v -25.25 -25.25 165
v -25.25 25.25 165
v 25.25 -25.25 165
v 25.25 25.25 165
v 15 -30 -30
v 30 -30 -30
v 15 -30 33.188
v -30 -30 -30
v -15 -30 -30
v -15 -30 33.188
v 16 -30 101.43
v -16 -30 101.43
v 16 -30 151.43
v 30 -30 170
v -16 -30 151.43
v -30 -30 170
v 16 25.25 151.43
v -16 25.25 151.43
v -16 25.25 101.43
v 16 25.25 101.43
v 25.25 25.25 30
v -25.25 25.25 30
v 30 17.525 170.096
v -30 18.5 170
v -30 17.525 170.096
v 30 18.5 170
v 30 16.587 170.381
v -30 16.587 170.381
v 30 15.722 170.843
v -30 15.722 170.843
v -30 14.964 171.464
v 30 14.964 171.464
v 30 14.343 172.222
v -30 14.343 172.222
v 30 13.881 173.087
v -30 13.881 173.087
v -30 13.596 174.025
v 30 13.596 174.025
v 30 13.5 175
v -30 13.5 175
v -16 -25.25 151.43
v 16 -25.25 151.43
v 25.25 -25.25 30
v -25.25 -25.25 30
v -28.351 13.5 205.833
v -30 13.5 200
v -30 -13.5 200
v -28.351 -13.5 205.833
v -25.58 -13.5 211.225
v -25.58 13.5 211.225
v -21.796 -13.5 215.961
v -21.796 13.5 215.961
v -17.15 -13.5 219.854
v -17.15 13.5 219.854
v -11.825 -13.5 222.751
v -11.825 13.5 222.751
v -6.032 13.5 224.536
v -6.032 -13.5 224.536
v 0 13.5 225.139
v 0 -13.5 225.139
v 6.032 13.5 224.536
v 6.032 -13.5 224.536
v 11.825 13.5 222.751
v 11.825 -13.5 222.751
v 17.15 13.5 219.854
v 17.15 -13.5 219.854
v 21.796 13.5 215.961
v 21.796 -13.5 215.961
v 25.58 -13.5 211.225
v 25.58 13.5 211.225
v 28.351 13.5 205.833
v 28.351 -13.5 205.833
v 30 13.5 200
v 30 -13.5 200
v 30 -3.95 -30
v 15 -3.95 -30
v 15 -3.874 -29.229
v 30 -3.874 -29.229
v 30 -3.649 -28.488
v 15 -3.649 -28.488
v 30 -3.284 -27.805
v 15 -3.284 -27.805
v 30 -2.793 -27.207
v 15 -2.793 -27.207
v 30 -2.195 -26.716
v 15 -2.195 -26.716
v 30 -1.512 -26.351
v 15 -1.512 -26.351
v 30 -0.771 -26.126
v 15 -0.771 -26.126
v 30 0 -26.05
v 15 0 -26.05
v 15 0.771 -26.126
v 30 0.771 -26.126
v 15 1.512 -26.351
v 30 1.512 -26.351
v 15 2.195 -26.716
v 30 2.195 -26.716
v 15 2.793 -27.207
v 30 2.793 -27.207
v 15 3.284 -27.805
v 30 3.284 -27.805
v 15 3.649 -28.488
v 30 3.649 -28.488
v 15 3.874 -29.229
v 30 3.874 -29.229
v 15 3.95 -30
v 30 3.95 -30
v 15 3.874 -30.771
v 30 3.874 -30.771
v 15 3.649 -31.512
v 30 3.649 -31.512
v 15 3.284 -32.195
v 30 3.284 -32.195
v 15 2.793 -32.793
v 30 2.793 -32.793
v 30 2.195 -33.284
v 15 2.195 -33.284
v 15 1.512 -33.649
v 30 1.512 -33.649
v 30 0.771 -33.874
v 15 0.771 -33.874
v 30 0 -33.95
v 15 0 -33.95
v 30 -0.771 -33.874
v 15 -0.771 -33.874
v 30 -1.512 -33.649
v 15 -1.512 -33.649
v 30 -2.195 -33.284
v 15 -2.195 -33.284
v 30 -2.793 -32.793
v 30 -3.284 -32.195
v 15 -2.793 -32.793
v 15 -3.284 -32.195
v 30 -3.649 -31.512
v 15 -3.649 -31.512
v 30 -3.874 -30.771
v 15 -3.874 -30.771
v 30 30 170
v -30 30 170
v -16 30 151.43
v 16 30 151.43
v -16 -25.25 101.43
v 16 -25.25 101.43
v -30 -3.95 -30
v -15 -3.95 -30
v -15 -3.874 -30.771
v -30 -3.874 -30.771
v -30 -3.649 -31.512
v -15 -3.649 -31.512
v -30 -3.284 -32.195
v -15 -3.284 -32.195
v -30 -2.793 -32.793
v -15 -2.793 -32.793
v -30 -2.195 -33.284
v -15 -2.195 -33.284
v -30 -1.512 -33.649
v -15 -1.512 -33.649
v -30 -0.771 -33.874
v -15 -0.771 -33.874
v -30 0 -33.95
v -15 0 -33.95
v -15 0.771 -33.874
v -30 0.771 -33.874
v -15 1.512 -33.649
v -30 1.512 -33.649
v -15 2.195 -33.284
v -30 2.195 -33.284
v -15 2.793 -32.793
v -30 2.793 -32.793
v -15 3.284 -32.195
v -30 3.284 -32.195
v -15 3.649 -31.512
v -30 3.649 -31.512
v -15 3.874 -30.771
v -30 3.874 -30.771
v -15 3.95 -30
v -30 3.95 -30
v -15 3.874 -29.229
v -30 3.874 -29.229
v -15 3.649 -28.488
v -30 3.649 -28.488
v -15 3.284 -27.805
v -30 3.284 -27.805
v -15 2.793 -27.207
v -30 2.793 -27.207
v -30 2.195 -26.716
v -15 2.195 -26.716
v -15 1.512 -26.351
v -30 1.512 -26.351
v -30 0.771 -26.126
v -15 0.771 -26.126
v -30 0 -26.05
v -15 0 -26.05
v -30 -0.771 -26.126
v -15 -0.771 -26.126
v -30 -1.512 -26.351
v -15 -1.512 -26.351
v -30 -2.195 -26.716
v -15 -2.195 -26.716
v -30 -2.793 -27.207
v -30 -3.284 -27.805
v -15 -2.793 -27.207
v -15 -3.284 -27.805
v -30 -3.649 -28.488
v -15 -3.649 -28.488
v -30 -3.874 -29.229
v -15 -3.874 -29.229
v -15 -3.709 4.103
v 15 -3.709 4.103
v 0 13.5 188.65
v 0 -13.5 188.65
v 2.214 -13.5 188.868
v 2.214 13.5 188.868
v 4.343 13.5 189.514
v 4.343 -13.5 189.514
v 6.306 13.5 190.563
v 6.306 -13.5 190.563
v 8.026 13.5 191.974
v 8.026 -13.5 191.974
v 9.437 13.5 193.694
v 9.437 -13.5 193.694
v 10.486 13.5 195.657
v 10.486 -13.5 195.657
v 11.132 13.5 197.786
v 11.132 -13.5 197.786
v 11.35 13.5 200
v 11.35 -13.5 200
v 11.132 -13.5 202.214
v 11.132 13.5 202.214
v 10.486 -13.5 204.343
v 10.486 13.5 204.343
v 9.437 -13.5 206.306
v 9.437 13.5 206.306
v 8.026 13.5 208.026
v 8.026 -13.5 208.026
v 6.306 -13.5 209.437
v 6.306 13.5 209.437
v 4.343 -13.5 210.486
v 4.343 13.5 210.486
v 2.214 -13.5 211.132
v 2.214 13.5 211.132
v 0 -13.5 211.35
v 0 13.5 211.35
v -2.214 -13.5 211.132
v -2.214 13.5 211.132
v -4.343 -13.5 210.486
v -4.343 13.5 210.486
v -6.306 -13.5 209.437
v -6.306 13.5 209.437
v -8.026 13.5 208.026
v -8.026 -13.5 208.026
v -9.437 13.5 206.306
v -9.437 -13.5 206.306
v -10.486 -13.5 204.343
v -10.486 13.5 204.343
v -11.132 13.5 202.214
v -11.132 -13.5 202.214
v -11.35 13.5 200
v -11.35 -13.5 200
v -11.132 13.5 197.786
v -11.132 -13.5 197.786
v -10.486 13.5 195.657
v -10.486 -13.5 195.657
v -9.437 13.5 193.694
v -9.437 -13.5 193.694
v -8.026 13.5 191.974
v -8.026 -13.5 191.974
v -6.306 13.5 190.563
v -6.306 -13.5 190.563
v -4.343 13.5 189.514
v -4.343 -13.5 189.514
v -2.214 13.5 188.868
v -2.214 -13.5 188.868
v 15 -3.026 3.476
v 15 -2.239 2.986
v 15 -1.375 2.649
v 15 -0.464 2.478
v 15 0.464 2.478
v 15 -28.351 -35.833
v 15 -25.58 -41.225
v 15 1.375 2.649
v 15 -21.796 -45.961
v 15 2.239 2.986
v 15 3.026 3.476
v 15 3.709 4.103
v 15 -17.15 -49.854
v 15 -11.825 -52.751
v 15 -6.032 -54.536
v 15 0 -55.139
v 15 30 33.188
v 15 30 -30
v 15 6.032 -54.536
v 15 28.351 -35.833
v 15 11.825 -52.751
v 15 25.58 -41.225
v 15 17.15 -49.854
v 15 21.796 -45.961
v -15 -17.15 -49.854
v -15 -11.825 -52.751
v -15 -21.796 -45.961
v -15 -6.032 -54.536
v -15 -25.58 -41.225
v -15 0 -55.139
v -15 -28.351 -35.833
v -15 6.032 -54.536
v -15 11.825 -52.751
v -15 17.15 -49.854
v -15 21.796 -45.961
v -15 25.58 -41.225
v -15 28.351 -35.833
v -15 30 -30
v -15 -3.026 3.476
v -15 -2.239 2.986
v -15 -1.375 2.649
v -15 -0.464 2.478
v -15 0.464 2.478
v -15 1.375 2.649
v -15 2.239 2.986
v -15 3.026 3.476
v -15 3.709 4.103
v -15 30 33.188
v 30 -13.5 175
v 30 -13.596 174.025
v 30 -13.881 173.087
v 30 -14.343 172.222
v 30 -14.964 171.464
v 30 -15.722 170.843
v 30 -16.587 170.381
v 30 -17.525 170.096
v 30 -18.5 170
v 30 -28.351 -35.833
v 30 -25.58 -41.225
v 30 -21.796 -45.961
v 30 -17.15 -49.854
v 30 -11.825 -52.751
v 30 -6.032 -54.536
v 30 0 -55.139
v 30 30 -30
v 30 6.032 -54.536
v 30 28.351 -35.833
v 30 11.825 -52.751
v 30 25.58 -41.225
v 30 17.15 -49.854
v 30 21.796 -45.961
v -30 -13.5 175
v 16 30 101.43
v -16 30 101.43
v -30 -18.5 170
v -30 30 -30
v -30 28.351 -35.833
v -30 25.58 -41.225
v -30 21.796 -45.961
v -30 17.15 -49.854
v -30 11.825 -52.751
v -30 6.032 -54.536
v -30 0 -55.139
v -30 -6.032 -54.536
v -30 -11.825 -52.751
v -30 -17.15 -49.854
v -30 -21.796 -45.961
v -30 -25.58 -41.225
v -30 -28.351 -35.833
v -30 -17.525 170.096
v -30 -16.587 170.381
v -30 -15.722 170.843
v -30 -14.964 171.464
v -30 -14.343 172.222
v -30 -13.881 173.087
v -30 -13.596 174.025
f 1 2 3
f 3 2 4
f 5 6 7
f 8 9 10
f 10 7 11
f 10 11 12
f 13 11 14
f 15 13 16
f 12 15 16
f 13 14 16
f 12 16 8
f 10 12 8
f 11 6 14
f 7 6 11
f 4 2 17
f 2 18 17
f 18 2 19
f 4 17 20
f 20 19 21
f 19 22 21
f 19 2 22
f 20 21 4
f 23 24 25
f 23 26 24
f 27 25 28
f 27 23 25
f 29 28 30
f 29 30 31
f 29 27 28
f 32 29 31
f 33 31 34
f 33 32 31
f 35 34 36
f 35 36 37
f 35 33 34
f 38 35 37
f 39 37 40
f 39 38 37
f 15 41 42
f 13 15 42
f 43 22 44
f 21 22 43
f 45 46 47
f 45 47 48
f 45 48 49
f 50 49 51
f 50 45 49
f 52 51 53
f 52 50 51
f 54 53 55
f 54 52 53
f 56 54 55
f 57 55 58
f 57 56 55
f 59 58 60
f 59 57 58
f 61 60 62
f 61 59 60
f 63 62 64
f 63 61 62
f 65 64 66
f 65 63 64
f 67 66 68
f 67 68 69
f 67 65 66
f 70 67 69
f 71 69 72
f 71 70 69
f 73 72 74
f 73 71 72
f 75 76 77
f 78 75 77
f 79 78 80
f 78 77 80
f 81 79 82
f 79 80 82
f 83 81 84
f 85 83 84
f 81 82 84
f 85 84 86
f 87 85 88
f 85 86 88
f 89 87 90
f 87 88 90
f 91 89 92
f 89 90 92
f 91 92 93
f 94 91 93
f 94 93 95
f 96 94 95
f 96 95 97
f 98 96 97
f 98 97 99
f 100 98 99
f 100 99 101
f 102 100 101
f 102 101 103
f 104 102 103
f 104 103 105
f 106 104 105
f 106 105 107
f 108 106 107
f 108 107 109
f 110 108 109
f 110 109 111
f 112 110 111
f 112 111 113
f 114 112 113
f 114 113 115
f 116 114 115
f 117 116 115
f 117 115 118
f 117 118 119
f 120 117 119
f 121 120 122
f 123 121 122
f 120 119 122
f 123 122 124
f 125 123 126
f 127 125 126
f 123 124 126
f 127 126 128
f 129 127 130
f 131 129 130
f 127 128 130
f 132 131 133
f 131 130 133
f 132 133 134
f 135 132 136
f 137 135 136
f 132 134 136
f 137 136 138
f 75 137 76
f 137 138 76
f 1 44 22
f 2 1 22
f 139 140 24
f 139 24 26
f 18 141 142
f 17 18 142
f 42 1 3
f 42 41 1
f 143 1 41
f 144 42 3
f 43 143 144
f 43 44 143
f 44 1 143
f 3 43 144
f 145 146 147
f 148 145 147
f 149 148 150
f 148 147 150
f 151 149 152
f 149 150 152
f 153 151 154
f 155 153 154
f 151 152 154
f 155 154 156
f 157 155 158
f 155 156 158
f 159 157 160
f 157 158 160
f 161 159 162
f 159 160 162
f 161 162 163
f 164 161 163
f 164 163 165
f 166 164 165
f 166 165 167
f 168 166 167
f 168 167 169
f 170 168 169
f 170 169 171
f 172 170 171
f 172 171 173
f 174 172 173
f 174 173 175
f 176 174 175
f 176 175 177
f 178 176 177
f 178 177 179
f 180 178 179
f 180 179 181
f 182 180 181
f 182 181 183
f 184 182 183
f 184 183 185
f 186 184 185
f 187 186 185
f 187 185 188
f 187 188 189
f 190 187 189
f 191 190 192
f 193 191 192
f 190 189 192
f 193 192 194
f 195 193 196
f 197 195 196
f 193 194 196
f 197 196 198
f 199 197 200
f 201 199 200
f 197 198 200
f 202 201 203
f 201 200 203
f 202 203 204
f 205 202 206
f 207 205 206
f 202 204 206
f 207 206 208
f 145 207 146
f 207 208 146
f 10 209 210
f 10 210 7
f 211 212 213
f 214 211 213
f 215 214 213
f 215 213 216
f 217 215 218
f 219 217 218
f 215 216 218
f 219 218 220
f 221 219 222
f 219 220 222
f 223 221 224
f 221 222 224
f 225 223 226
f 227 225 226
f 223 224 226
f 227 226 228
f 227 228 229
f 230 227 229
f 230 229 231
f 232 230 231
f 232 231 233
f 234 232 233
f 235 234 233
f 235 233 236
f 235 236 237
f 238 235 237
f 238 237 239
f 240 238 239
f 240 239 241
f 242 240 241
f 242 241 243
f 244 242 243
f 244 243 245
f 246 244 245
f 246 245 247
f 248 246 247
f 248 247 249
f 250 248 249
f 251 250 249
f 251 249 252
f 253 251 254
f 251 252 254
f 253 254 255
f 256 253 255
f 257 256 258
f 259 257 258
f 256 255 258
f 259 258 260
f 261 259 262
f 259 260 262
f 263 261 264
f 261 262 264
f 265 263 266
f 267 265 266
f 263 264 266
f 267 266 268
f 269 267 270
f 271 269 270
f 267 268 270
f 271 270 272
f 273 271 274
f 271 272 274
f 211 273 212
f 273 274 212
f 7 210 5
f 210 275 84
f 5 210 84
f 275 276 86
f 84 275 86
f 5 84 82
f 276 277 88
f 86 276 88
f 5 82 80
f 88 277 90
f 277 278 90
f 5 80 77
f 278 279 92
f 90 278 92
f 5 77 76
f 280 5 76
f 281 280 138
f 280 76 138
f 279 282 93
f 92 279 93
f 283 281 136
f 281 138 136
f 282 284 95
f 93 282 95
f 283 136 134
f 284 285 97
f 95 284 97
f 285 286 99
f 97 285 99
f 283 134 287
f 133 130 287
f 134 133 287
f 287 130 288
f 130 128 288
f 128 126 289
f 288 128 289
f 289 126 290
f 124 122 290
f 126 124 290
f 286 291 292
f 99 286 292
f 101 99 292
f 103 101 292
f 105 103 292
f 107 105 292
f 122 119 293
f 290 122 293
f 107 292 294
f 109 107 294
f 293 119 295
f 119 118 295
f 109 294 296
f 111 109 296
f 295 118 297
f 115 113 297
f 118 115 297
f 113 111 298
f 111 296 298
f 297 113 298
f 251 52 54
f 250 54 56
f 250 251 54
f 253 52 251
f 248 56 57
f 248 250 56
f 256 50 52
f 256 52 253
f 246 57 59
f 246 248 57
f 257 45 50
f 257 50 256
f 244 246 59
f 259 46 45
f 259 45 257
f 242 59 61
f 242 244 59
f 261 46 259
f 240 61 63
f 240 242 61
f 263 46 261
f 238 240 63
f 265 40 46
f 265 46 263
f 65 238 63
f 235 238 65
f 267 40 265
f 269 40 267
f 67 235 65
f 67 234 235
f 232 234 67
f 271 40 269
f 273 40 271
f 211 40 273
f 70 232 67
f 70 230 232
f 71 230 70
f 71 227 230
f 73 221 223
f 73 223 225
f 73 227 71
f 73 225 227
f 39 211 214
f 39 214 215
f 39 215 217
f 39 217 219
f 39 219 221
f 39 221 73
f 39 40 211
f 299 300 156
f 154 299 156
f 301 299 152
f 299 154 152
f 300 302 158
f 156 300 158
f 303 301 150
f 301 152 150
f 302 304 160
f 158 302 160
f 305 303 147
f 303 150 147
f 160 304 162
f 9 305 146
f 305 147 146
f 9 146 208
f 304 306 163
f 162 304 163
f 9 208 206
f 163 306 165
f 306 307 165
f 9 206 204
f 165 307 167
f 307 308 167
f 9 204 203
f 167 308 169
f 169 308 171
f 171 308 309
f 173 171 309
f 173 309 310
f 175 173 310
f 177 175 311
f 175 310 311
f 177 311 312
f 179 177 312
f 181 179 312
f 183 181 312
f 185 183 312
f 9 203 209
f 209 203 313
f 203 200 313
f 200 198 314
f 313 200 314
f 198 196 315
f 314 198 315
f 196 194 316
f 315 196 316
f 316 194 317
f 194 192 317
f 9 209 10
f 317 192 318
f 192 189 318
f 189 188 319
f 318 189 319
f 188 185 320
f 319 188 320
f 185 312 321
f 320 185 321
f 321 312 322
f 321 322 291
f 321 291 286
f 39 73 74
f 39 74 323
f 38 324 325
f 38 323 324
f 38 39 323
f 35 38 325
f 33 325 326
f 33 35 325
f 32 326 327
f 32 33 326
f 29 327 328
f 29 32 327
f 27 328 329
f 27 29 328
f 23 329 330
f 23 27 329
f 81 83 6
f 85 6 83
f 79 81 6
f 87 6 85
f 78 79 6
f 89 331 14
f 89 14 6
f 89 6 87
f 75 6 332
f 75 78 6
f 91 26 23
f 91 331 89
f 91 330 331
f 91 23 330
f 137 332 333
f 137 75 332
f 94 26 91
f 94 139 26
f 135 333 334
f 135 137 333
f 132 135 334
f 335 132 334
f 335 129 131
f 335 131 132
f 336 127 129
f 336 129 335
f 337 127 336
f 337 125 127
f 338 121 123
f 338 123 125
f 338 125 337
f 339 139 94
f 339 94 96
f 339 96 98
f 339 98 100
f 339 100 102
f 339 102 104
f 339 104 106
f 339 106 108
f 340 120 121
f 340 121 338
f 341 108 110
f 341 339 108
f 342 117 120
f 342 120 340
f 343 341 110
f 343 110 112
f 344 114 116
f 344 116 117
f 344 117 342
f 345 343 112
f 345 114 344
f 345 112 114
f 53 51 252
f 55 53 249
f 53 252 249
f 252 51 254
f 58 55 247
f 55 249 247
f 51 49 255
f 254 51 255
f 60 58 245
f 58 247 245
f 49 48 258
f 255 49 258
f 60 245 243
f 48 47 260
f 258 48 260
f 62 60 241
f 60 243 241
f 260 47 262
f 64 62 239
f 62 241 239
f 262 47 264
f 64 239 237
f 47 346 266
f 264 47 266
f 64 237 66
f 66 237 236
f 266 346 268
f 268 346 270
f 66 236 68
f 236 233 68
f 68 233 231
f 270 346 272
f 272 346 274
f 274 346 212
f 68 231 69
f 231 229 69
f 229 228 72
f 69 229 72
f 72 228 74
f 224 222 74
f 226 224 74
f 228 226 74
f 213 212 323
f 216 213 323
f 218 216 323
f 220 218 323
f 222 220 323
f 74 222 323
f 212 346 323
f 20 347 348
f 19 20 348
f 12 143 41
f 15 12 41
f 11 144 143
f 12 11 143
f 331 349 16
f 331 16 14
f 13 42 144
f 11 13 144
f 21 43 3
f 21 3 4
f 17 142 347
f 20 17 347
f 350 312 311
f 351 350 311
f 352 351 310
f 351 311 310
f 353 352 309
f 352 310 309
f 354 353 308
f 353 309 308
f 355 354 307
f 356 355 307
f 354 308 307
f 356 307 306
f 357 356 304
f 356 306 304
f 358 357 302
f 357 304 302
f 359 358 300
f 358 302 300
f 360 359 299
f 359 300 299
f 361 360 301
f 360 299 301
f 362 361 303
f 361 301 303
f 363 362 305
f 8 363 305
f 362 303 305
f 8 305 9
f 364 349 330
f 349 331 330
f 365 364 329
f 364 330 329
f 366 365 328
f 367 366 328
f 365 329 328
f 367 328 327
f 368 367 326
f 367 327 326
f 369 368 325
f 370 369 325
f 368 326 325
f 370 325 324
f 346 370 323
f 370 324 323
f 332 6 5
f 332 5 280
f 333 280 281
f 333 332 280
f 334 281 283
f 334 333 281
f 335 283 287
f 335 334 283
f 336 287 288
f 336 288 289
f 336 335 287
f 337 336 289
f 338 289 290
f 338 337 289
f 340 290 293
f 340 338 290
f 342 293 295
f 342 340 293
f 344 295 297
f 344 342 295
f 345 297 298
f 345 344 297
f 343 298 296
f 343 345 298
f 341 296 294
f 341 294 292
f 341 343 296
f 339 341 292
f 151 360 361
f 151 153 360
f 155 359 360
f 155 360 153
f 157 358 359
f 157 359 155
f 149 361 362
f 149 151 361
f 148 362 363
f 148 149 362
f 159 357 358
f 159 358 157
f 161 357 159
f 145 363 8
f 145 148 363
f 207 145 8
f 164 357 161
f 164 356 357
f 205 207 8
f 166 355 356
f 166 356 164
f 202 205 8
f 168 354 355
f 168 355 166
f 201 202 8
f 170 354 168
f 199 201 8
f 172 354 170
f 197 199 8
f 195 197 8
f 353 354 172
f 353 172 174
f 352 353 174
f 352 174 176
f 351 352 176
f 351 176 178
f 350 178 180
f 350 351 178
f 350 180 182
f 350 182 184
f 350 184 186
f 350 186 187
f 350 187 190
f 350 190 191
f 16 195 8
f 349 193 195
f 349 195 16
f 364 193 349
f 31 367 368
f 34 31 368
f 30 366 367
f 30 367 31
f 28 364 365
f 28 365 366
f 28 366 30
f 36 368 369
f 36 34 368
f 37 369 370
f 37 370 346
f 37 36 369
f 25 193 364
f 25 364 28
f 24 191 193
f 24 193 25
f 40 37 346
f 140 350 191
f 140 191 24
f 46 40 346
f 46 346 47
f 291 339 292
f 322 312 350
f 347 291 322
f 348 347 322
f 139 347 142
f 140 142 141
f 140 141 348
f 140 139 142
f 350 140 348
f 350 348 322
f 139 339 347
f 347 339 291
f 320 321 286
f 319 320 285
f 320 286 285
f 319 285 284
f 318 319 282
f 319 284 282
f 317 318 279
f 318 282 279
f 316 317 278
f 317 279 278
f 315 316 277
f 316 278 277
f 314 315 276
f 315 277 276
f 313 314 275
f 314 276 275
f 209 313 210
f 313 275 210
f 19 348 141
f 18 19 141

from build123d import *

# Parameters (mm, degrees)
SKETCH2_W               = 60
SKETCH2_H               = 60
BOSS_EXTRUDE1_DEPTH     = 170
SKETCH3_W               = 15
SKETCH3_H               = 60
BOSS_EXTRUDE2_DEPTH     = 30
BOSS_EXTRUDE3_DEPTH     = 15
BOSS_EXTRUDE4_START     = -15
BOSS_EXTRUDE4_DEPTH     = 15
SKETCH6_W               = 60
SKETCH6_H               = 27
BOSS_EXTRUDE5_DEPTH     = 30
BOSS_EXTRUDE6_DEPTH     = 27
CUT_EXTRUDE2_DEPTH      = 5
CUT_EXTRUDE2_DEPTH_BACK = 130
CUT_EXTRUDE2_START      = -10
SKETCH8_W               = 50.5
SKETCH8_H               = 50.5
SKETCH9_R               = 11.35
CUT_EXTRUDE3_DEPTH      = 130
SKETCH11_R              = 3.95
CUT_EXTRUDE4_DEPTH      = 232.543759953
SKETCH12_R              = 3.95
CUT_EXTRUDE5_DEPTH      = 232.543759953
CUT_EXTRUDE7_DEPTH      = 30
FILLET2_R               = 5
FILLET3_R               = 5
SKETCH16_W              = 16
SKETCH16_H              = 11.5
CUT_EXTRUDE8_DEPTH      = 71


with BuildPart() as part:
    # Sketch2 → Boss-Extrude1 (new body)
    with BuildSketch(Plane.XY):
        Rectangle(SKETCH2_W, SKETCH2_H)
    extrude(amount=BOSS_EXTRUDE1_DEPTH)

    # Sketch3 → Boss-Extrude2 (add)
    with BuildSketch(Plane(origin=(0, 0, 0), x_dir=(-1, 0, 0), z_dir=(0, 0, -1))):
        with Locations((22.5, 0)):
            Rectangle(SKETCH3_W, SKETCH3_H)
        with Locations((-22.5, 0)):
            Rectangle(SKETCH3_W, SKETCH3_H)
    extrude(amount=BOSS_EXTRUDE2_DEPTH)

    # Sketch4 → Boss-Extrude3 (add)
    with BuildSketch(Plane(origin=(30, 0, 0), x_dir=(0, 0, -1), z_dir=(1, 0, 0))):
        with BuildLine():
            Line((30, 30), (30, -30))
            ThreePointArc((30, -30), (55.138874415, 0), (30, 30))
        make_face()
    extrude(amount=-BOSS_EXTRUDE3_DEPTH)

    # Sketch5 → Boss-Extrude4 (add)
    with BuildSketch(Plane.ZY.offset(30).offset(BOSS_EXTRUDE4_START)):
        with BuildLine():
            Line((-30, -30), (-30, 30))
            ThreePointArc((-30, 30), (-55.138874415, 0), (-30, -30))
        make_face()
    extrude(amount=BOSS_EXTRUDE4_DEPTH)

    # Sketch6 → Boss-Extrude5 (add)
    with BuildSketch(Plane.XY.offset(170)):
        Rectangle(SKETCH6_W, SKETCH6_H)
    extrude(amount=BOSS_EXTRUDE5_DEPTH)

    # Sketch7 → Boss-Extrude6 (add)
    with BuildSketch(Plane(origin=(0, 13.5, 0), x_dir=(1, 0, 0), z_dir=(0, 1, 0))):
        with BuildLine():
            Line((30, -200), (-30, -200))
            ThreePointArc((-30, -200), (0, -225.138874415), (30, -200))
        make_face()
    extrude(amount=-BOSS_EXTRUDE6_DEPTH)

    # Sketch8 → Cut-Extrude2 (cut, two sides: drawn at the far end of the back side and taken through both)
    with BuildSketch(Plane.XY.offset(170).offset(CUT_EXTRUDE2_START - CUT_EXTRUDE2_DEPTH_BACK)):
        Rectangle(SKETCH8_W, SKETCH8_H)
    extrude(amount=CUT_EXTRUDE2_DEPTH + CUT_EXTRUDE2_DEPTH_BACK, mode=Mode.SUBTRACT)

    # Sketch9 → Cut-Extrude3 (cut)
    with BuildSketch(Plane(origin=(0, -13.5, 0), x_dir=(-1, 0, 0), z_dir=(0, -1, 0))):
        with Locations(Location((0, -200, 0), (0, 0, 90))):
            Circle(SKETCH9_R)
    extrude(amount=-CUT_EXTRUDE3_DEPTH, mode=Mode.SUBTRACT)

    # Sketch11 → Cut-Extrude4 (cut, through all)
    with BuildSketch(Plane.ZY.offset(-15)):
        with Locations(Location((-30, 0, 0), (0, 0, 270))):
            Circle(SKETCH11_R)
    extrude(amount=-CUT_EXTRUDE4_DEPTH, mode=Mode.SUBTRACT)

    # Sketch12 → Cut-Extrude5 (cut, through all)
    with BuildSketch(Plane(origin=(-15, 0, 0), x_dir=(0, 0, -1), z_dir=(1, 0, 0))):
        with Locations(Location((30, 0, 0), (0, 0, 270))):
            Circle(SKETCH12_R)
    extrude(amount=-CUT_EXTRUDE5_DEPTH, mode=Mode.SUBTRACT)

    # Sketch14 → Cut-Extrude7 (cut)
    with BuildSketch(Plane(origin=(-15, 0, 0), x_dir=(0, 0, -1), z_dir=(1, 0, 0))):
        Polygon((0, -30), (0, 0), (-33.188384016, -30), align=None)
        Polygon((-33.188384016, 30), (0, 0), (0, 30), align=None)
    extrude(amount=CUT_EXTRUDE7_DEPTH, mode=Mode.SUBTRACT)

    # Fillet2
    fillet2_edges = [part.edges().sort_by_distance(p)[0] for p in [
        (0, 0, 0),
    ]]
    fillet(fillet2_edges, radius=FILLET2_R)

    # Fillet3
    fillet3_edges = [part.edges().sort_by_distance(p)[0] for p in [
        (0, 13.5, 170),
        (0, -13.5, 170),
    ]]
    fillet(fillet3_edges, radius=FILLET3_R)

    # Sketch16 → Cut-Extrude8 (cut)
    with BuildSketch(Plane(origin=(0, 30, 0), x_dir=(1, 0, 0), z_dir=(0, 1, 0))):
        Polygon((16, -151.43), (16, -101.43), (-16, -101.43), (-16, -139.93), (0, -139.93), (0, -151.43), align=None)
        with Locations((-8, -145.68)):
            Rectangle(SKETCH16_W, SKETCH16_H)
    extrude(amount=-CUT_EXTRUDE8_DEPTH, mode=Mode.SUBTRACT)


solid = part.part
